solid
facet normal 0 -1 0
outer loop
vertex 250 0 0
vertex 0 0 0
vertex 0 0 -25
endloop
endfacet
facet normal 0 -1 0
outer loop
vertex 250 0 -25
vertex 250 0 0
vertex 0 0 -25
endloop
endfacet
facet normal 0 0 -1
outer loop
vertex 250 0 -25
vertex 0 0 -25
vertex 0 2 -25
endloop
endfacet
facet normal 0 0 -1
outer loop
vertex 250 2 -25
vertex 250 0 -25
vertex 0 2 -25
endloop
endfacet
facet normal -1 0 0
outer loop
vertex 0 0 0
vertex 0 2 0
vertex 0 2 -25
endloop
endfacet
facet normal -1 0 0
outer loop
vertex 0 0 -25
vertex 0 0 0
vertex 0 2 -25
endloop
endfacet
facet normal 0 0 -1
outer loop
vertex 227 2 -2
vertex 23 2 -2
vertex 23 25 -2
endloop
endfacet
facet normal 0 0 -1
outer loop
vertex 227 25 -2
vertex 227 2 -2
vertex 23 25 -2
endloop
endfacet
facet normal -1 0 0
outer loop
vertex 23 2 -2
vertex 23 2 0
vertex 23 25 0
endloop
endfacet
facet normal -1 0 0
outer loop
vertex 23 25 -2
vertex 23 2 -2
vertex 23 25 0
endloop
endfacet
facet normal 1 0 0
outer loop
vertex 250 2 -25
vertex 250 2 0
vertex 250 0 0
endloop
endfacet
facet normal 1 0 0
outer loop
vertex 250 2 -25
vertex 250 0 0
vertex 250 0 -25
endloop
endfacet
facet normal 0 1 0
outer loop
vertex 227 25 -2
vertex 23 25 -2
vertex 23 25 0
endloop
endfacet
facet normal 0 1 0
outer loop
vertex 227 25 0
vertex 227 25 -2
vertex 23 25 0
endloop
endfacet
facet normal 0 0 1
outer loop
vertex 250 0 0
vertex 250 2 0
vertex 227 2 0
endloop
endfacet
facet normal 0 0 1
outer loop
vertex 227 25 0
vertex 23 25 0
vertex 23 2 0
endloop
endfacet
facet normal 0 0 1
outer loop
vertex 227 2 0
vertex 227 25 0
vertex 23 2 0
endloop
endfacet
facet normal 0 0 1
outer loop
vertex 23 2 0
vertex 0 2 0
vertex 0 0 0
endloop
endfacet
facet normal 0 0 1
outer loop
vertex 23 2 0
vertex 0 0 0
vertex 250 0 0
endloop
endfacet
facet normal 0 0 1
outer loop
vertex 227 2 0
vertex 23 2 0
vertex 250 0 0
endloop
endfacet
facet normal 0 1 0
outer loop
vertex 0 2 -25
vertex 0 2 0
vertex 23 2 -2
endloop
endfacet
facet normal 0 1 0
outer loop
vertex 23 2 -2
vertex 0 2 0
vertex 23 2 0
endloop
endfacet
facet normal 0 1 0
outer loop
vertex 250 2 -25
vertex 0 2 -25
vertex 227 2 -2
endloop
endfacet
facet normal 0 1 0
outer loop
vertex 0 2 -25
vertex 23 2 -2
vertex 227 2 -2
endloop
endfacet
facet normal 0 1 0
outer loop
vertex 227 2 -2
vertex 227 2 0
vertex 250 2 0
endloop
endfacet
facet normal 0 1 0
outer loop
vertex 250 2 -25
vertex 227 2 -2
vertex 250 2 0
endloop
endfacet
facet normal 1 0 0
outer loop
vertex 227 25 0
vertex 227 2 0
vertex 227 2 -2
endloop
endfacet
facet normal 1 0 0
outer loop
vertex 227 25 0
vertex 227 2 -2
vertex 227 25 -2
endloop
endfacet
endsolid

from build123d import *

# Parameters (mm, degrees)
EXTRUDE_1_DEPTH     = 250
SKETCH_2_W          = 23
SKETCH_2_H          = 23
CUT_EXTRUDE_1_DEPTH = 26


with BuildPart() as part:
    # Эскиз1 → Вытянуть-Тонкостенный1 (new body)
    with BuildSketch(Plane(origin=(0, 0, 0), x_dir=(0, 0, -1), z_dir=(1, 0, 0))):
        Polygon((0, 25), (0, 0), (25, 0), (25, 2), (2, 2), (2, 25), align=None)
    extrude(amount=EXTRUDE_1_DEPTH)

    # Эскиз2 → Вырез-Вытянуть1 (cut, through all)
    with BuildSketch(Plane.XY):
        with Locations((238.5, 13.5)):
            Rectangle(SKETCH_2_W, SKETCH_2_H)
        with Locations((11.5, 13.5)):
            Rectangle(SKETCH_2_W, SKETCH_2_H)
    extrude(amount=-CUT_EXTRUDE_1_DEPTH, mode=Mode.SUBTRACT)


solid = part.part
